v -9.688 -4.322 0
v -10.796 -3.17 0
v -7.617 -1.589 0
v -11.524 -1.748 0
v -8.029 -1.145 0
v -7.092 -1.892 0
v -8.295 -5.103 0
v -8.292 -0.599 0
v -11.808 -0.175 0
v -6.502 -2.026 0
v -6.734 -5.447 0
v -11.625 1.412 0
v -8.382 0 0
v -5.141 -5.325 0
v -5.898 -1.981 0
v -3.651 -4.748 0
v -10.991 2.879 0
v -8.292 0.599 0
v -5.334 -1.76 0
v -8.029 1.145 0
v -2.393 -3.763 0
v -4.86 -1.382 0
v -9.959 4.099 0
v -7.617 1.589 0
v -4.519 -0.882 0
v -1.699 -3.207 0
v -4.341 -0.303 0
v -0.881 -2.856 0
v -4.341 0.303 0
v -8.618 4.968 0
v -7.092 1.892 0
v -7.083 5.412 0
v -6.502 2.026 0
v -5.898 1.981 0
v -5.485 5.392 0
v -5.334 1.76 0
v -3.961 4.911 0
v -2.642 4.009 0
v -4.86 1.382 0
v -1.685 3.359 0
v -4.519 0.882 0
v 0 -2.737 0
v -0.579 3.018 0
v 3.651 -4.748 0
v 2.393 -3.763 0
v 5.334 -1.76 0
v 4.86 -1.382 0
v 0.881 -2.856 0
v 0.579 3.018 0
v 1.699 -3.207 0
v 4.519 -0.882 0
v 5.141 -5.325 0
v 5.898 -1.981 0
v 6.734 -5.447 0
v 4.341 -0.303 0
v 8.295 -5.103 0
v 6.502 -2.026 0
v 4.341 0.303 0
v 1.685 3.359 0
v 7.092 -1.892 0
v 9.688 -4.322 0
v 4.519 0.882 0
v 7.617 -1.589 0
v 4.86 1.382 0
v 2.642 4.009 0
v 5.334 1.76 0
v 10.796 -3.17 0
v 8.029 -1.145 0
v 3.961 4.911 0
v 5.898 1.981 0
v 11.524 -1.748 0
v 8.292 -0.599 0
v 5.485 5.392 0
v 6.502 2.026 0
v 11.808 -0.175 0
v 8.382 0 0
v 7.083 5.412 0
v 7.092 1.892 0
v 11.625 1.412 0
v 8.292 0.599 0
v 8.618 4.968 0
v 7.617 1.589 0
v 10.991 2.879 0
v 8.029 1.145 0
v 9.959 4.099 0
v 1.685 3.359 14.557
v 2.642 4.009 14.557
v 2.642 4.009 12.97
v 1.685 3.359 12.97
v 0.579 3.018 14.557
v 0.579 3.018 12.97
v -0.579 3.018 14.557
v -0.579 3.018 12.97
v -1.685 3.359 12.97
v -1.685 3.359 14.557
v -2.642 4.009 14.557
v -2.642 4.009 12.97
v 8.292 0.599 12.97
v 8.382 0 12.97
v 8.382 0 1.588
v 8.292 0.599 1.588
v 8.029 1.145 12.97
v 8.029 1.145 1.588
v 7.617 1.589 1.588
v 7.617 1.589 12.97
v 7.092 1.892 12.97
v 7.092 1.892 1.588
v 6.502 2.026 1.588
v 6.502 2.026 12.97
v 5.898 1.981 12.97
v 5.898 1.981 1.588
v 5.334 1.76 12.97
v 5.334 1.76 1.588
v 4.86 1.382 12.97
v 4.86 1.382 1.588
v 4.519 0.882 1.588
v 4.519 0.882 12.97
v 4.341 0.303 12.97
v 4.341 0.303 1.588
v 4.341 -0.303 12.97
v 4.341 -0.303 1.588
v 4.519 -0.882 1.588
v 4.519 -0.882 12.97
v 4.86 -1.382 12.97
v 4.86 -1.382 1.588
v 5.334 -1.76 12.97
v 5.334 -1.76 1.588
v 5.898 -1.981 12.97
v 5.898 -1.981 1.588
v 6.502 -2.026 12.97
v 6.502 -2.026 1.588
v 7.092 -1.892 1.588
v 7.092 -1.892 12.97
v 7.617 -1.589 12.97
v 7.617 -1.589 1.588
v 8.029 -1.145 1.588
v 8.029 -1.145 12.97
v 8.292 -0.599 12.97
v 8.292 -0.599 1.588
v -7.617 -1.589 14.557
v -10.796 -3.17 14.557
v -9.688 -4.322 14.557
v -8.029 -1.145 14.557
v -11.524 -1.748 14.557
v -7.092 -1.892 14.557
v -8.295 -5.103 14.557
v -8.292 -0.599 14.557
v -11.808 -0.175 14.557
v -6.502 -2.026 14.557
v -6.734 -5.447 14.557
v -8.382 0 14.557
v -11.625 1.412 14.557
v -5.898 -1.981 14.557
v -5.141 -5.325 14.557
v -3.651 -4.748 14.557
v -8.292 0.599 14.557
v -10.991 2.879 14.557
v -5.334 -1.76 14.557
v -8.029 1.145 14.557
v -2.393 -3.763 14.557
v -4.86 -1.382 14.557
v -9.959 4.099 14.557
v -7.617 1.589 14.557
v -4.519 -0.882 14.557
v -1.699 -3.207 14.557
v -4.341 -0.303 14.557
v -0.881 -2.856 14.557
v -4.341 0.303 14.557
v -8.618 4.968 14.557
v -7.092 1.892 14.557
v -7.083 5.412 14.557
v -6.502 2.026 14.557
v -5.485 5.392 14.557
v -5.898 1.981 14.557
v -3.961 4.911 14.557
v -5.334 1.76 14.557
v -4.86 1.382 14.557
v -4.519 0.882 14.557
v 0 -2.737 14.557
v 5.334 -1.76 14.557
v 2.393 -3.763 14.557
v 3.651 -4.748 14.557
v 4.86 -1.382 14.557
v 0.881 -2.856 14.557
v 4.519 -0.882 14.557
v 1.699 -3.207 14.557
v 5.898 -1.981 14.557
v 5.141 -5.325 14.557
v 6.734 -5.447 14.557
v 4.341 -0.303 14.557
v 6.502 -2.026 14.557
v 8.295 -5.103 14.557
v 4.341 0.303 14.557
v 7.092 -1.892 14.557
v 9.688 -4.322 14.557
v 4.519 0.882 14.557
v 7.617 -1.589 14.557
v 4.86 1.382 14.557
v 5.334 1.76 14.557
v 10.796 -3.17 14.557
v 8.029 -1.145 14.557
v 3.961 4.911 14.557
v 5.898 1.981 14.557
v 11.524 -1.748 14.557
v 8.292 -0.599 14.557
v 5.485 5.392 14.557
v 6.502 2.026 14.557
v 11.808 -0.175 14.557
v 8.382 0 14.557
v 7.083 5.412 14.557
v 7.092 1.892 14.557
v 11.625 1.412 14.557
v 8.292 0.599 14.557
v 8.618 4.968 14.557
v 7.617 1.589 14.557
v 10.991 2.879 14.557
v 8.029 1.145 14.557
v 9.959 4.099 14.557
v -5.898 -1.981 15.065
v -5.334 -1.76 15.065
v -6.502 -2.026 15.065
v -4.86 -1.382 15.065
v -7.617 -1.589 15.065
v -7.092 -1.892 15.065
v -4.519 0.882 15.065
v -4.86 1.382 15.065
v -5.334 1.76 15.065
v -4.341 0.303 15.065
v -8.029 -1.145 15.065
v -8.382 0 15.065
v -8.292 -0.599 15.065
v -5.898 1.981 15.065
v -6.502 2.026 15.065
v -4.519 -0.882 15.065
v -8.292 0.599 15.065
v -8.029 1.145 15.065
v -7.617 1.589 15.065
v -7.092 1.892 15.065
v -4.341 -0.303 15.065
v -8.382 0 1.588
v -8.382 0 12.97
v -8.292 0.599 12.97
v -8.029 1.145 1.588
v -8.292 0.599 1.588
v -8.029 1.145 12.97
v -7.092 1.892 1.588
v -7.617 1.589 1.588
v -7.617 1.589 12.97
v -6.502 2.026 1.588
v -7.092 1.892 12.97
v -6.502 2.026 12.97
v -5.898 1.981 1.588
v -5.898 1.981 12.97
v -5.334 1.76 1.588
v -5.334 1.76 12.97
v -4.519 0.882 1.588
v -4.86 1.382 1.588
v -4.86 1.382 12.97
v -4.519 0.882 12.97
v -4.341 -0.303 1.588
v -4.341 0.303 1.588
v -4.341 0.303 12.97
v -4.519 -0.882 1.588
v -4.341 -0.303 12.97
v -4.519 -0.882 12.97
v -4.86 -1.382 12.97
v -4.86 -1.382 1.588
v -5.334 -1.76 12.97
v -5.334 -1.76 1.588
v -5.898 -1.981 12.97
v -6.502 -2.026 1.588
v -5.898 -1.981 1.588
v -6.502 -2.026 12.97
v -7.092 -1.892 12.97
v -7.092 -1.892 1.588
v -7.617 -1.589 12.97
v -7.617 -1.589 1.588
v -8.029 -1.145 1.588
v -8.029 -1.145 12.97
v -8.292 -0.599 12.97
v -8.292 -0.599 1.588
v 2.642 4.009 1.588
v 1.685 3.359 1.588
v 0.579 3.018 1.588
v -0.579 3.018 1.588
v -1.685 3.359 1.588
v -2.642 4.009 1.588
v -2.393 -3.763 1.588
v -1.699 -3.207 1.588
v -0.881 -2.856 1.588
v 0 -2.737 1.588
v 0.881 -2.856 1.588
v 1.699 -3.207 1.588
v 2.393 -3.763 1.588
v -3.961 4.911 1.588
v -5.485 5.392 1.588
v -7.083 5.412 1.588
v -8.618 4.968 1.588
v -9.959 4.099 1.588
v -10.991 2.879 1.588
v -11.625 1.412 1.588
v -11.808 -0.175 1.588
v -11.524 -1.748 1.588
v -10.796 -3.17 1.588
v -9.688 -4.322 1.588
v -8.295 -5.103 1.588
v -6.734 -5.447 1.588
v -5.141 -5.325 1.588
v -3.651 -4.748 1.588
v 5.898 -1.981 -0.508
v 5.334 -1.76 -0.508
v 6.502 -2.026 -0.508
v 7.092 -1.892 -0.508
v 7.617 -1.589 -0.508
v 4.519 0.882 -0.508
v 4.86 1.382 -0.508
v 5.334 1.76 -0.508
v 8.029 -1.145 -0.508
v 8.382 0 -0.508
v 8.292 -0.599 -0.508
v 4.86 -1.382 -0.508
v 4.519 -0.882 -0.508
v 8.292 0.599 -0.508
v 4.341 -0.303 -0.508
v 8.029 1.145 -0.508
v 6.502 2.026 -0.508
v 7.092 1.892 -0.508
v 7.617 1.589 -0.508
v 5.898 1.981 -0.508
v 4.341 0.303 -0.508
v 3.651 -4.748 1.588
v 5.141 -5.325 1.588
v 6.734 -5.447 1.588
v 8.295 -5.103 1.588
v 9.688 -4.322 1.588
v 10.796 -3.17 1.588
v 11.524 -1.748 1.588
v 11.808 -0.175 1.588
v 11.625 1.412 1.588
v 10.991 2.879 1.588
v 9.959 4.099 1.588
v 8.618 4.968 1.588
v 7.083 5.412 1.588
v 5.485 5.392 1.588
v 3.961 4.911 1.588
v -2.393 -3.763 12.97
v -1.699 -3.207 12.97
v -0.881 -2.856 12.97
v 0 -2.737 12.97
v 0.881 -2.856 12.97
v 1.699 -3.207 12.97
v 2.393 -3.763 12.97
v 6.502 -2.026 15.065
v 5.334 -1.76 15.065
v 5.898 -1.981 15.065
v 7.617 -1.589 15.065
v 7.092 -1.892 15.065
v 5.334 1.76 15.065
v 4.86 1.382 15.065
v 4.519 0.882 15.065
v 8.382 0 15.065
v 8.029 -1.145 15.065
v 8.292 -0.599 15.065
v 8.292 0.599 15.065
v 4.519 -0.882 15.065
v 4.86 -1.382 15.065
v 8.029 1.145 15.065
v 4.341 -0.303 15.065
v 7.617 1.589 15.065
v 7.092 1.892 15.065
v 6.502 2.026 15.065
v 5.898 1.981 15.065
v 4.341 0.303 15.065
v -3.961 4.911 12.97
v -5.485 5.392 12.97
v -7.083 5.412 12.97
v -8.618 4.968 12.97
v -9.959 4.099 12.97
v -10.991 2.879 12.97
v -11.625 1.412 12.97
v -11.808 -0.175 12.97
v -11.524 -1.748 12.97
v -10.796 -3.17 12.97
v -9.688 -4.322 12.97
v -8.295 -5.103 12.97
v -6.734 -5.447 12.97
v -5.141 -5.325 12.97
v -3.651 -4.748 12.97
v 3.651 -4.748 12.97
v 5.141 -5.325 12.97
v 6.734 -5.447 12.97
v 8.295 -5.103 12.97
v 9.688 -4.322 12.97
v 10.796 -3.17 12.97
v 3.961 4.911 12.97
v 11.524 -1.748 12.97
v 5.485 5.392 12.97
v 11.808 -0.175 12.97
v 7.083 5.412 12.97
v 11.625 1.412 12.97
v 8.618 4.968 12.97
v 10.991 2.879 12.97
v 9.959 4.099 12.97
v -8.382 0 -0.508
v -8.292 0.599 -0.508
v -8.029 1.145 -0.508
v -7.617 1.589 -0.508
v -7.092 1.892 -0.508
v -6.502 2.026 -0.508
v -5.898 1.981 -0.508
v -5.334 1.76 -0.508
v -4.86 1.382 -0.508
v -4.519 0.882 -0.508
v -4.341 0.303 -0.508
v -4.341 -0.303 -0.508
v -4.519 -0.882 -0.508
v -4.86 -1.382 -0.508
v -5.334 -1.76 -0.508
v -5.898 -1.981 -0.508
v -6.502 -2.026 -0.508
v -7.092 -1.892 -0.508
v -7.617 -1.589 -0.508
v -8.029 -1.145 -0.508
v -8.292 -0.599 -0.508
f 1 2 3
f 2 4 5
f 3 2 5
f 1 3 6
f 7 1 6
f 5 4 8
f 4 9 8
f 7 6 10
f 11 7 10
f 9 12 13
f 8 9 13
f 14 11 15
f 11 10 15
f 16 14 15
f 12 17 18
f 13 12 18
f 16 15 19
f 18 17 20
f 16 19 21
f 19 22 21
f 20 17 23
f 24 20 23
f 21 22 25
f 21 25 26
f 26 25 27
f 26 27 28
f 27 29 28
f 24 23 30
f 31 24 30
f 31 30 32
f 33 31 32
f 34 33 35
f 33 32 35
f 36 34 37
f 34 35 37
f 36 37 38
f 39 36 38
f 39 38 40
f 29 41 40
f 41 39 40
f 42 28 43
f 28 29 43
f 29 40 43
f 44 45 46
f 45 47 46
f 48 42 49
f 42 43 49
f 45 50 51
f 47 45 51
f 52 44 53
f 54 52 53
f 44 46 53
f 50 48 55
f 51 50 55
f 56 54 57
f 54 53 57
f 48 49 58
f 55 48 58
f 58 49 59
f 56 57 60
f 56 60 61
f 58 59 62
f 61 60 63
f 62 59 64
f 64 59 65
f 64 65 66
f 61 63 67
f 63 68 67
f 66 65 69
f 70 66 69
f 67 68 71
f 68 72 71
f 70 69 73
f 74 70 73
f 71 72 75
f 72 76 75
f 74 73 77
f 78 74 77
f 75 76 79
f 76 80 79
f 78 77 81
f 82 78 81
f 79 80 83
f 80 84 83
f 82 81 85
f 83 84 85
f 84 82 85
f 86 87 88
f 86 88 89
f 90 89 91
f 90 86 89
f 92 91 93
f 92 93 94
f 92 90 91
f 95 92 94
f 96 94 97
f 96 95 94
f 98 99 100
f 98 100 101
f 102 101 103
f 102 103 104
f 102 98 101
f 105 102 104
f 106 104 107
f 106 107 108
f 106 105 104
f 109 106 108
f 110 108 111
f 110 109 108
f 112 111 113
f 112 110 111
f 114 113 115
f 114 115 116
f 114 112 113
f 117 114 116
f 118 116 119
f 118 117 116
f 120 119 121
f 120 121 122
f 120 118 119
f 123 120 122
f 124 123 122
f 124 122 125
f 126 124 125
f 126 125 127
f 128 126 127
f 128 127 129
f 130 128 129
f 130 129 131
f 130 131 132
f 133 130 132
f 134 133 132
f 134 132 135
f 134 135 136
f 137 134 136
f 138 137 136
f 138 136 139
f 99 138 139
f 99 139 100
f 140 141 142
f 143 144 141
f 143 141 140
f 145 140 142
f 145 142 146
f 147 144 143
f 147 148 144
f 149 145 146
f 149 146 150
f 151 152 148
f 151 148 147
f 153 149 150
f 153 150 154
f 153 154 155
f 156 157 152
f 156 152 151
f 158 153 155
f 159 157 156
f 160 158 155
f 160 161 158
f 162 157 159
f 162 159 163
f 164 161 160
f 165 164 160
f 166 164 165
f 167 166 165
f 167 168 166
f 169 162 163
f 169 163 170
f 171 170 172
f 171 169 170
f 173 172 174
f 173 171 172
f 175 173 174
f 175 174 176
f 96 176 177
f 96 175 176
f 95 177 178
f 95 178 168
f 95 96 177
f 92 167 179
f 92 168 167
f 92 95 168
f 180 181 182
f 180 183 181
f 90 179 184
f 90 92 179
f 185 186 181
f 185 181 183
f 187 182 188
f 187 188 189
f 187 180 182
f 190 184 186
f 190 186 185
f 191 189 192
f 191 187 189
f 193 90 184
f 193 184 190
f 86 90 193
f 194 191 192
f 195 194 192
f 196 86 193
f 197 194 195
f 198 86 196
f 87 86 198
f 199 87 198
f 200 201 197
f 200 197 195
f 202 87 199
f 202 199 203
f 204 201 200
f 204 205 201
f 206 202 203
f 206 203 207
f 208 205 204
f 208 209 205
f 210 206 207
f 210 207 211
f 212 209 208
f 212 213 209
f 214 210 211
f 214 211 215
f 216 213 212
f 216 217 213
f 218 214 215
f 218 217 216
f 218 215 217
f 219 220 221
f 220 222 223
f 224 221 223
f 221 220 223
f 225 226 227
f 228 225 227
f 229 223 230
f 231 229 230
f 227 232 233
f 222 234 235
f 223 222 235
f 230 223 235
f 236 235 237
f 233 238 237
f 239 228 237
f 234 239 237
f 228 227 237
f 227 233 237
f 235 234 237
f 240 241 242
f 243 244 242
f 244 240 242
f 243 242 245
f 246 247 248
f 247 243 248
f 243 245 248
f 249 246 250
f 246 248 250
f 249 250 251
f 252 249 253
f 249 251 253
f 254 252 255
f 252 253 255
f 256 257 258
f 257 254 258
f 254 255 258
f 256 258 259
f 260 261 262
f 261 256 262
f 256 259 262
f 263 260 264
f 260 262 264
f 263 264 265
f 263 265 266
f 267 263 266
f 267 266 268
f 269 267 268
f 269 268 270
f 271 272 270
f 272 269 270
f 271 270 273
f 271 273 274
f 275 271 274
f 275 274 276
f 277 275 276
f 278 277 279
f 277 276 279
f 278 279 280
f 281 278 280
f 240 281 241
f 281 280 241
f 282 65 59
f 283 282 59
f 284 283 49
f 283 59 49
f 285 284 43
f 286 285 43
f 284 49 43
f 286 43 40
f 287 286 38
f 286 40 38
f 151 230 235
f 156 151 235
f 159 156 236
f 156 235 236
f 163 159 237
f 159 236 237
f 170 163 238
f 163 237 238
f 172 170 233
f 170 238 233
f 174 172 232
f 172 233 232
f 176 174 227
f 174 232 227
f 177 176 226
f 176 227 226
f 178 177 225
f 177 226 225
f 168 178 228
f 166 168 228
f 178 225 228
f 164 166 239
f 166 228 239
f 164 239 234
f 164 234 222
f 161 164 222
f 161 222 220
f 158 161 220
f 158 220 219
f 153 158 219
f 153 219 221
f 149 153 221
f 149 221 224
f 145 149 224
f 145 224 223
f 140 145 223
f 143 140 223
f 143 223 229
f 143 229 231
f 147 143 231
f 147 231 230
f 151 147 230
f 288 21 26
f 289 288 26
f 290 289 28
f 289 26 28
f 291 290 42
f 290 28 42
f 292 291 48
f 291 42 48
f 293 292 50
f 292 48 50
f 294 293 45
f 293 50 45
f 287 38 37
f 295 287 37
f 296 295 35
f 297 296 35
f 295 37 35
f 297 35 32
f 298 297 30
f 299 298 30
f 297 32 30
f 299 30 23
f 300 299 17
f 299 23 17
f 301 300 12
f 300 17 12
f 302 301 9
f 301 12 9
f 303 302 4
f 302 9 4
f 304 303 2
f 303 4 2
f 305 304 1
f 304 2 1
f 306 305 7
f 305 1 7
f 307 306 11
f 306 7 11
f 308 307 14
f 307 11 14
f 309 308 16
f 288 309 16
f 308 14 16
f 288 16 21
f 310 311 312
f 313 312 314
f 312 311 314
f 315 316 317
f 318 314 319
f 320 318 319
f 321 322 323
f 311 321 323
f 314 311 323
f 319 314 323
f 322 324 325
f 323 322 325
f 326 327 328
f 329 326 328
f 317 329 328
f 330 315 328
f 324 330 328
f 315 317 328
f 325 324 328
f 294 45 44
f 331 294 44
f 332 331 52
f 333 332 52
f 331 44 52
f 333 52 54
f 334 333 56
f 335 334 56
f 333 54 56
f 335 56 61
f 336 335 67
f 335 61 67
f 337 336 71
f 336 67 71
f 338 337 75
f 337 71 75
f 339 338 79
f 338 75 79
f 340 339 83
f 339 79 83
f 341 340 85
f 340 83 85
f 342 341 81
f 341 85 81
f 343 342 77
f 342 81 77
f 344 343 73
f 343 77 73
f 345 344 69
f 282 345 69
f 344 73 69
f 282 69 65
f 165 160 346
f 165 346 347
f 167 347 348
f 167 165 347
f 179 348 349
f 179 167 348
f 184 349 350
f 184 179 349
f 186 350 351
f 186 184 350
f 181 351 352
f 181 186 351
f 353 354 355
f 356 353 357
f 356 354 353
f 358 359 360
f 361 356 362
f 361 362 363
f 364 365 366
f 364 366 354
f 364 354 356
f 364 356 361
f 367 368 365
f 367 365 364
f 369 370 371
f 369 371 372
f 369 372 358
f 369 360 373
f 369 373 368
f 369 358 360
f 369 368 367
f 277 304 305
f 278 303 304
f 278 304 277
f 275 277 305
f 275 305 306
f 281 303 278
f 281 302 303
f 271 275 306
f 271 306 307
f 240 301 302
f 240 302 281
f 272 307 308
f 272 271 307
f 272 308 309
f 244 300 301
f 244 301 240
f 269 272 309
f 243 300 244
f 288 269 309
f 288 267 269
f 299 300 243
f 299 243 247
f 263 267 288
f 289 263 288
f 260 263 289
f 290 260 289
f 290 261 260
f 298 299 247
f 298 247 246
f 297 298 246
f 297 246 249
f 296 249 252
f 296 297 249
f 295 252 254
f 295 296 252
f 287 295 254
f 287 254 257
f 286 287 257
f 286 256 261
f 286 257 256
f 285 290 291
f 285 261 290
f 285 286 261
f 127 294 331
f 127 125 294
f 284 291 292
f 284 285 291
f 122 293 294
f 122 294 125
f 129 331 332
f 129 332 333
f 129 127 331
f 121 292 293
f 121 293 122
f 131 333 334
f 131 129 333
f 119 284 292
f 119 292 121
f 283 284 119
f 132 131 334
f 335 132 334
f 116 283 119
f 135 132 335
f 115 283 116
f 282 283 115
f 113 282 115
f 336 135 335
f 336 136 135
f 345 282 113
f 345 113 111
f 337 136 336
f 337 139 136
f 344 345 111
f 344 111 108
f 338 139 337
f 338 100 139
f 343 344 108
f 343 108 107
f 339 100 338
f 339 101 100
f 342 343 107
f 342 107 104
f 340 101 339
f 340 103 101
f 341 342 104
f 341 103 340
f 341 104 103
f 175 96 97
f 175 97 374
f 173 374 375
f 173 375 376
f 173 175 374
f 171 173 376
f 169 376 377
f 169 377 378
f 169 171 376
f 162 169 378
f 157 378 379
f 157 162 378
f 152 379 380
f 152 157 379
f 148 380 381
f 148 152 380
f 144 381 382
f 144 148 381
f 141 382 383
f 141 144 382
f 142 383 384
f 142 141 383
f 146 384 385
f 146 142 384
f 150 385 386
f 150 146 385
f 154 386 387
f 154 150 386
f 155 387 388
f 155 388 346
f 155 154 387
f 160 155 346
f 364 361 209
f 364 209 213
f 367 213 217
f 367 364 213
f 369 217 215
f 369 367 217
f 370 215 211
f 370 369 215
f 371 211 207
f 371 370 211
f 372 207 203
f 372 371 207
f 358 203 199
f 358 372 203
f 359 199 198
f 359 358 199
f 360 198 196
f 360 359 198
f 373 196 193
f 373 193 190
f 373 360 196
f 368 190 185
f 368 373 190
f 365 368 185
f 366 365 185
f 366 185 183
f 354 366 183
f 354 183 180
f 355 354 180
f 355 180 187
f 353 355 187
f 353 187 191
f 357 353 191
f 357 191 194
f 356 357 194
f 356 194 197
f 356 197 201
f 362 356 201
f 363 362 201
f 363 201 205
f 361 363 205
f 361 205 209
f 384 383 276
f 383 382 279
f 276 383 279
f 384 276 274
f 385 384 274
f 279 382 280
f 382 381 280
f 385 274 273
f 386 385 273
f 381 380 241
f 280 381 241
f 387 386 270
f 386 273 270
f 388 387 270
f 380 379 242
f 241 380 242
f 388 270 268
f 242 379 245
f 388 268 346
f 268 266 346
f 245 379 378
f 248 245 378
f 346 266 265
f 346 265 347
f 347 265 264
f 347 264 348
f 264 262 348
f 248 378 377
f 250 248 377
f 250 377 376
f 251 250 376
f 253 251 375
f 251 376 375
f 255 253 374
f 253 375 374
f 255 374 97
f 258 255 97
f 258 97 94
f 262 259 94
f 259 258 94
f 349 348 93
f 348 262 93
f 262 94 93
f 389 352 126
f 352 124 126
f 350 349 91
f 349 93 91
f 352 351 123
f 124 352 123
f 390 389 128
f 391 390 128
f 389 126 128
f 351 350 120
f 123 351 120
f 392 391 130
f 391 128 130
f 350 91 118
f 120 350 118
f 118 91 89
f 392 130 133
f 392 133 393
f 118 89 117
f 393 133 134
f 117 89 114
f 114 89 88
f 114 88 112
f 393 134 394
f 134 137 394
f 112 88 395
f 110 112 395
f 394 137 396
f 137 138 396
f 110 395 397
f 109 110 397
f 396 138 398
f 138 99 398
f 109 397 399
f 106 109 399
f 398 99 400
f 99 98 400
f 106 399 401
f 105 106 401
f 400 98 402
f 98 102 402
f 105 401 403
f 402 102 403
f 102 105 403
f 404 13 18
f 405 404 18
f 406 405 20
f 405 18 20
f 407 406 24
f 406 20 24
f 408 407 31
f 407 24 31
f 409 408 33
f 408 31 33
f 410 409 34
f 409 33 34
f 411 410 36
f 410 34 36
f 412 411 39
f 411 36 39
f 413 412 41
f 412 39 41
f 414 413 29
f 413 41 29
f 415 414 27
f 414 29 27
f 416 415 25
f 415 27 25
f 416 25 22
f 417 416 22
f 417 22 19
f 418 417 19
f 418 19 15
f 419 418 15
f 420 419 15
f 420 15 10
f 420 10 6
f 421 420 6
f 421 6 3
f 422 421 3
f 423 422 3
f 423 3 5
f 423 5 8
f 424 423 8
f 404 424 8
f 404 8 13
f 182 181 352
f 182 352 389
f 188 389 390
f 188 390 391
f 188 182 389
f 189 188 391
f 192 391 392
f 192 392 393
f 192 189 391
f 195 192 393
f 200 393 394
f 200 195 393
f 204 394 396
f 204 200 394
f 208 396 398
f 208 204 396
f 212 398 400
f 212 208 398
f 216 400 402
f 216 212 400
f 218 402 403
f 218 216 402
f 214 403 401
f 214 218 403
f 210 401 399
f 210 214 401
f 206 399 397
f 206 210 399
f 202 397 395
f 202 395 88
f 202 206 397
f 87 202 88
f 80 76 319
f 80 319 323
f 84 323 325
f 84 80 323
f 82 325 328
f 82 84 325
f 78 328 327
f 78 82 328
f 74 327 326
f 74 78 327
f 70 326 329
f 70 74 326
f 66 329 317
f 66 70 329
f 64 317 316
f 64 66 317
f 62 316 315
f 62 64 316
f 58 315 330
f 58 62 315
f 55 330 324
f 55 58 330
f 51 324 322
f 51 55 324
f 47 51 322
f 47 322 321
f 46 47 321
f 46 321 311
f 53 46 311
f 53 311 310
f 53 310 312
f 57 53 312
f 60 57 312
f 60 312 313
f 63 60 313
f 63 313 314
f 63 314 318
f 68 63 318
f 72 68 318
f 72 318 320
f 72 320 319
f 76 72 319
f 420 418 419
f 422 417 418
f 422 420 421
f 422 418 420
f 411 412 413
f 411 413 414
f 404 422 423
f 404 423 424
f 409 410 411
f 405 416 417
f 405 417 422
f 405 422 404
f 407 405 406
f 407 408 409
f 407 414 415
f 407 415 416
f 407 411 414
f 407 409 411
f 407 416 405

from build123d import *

# Parameters (mm, degrees)
SKETCH1_R           = 2.032
BOSS_EXTRUDE1_DEPTH = 1.5875
BOSS_EXTRUDE2_START = -15.065248
SKETCH2_R           = 2.032
BOSS_EXTRUDE2_DEPTH = 15.573248


with BuildPart() as part:
    # Sketch1 → Boss-Extrude1 (new body)
    with BuildSketch(Plane.XY):
        with BuildLine():
            ThreePointArc((-2.642212666, 4.009343348), (-11.808186134, -0.175285856), (-2.392603437, -3.763181293))
            ThreePointArc((-2.392603437, -3.763181293), (0, -2.73669663), (2.392603437, -3.763181293))
            ThreePointArc((2.392603437, -3.763181293), (11.808186134, -0.175285856), (2.642212666, 4.009343348))
            ThreePointArc((2.642212666, 4.009343348), (0, 2.974875822), (-2.642212666, 4.009343348))
        make_face()
        with Locations((-6.35, 0)):
            Circle(SKETCH1_R, mode=Mode.SUBTRACT)
        with Locations((6.35, 0)):
            Circle(SKETCH1_R, mode=Mode.SUBTRACT)
    boss_extrude1 = extrude(amount=BOSS_EXTRUDE1_DEPTH)

    # Sketch2 → Boss-Extrude2 (add)
    with BuildSketch(Plane(origin=(0, 0, 0), x_dir=(-1, 0, 0), z_dir=(0, 0, -1)).offset(BOSS_EXTRUDE2_START)):
        with Locations((6.35, 0)):
            Circle(SKETCH2_R)
    boss_extrude2 = extrude(amount=BOSS_EXTRUDE2_DEPTH)

    # Mirror2: Boss-Extrude1 across plane
    add(boss_extrude1.mirror(Plane(origin=(0, 0, 7.278624), x_dir=(1, 0, 0), z_dir=(0, 0, -1))))

    # Mirror3: Boss-Extrude2 across plane
    add(boss_extrude2.mirror(Plane(origin=(0, 0, 0), x_dir=(0, 0, 1), z_dir=(1, 0, 0))))


solid = part.part
